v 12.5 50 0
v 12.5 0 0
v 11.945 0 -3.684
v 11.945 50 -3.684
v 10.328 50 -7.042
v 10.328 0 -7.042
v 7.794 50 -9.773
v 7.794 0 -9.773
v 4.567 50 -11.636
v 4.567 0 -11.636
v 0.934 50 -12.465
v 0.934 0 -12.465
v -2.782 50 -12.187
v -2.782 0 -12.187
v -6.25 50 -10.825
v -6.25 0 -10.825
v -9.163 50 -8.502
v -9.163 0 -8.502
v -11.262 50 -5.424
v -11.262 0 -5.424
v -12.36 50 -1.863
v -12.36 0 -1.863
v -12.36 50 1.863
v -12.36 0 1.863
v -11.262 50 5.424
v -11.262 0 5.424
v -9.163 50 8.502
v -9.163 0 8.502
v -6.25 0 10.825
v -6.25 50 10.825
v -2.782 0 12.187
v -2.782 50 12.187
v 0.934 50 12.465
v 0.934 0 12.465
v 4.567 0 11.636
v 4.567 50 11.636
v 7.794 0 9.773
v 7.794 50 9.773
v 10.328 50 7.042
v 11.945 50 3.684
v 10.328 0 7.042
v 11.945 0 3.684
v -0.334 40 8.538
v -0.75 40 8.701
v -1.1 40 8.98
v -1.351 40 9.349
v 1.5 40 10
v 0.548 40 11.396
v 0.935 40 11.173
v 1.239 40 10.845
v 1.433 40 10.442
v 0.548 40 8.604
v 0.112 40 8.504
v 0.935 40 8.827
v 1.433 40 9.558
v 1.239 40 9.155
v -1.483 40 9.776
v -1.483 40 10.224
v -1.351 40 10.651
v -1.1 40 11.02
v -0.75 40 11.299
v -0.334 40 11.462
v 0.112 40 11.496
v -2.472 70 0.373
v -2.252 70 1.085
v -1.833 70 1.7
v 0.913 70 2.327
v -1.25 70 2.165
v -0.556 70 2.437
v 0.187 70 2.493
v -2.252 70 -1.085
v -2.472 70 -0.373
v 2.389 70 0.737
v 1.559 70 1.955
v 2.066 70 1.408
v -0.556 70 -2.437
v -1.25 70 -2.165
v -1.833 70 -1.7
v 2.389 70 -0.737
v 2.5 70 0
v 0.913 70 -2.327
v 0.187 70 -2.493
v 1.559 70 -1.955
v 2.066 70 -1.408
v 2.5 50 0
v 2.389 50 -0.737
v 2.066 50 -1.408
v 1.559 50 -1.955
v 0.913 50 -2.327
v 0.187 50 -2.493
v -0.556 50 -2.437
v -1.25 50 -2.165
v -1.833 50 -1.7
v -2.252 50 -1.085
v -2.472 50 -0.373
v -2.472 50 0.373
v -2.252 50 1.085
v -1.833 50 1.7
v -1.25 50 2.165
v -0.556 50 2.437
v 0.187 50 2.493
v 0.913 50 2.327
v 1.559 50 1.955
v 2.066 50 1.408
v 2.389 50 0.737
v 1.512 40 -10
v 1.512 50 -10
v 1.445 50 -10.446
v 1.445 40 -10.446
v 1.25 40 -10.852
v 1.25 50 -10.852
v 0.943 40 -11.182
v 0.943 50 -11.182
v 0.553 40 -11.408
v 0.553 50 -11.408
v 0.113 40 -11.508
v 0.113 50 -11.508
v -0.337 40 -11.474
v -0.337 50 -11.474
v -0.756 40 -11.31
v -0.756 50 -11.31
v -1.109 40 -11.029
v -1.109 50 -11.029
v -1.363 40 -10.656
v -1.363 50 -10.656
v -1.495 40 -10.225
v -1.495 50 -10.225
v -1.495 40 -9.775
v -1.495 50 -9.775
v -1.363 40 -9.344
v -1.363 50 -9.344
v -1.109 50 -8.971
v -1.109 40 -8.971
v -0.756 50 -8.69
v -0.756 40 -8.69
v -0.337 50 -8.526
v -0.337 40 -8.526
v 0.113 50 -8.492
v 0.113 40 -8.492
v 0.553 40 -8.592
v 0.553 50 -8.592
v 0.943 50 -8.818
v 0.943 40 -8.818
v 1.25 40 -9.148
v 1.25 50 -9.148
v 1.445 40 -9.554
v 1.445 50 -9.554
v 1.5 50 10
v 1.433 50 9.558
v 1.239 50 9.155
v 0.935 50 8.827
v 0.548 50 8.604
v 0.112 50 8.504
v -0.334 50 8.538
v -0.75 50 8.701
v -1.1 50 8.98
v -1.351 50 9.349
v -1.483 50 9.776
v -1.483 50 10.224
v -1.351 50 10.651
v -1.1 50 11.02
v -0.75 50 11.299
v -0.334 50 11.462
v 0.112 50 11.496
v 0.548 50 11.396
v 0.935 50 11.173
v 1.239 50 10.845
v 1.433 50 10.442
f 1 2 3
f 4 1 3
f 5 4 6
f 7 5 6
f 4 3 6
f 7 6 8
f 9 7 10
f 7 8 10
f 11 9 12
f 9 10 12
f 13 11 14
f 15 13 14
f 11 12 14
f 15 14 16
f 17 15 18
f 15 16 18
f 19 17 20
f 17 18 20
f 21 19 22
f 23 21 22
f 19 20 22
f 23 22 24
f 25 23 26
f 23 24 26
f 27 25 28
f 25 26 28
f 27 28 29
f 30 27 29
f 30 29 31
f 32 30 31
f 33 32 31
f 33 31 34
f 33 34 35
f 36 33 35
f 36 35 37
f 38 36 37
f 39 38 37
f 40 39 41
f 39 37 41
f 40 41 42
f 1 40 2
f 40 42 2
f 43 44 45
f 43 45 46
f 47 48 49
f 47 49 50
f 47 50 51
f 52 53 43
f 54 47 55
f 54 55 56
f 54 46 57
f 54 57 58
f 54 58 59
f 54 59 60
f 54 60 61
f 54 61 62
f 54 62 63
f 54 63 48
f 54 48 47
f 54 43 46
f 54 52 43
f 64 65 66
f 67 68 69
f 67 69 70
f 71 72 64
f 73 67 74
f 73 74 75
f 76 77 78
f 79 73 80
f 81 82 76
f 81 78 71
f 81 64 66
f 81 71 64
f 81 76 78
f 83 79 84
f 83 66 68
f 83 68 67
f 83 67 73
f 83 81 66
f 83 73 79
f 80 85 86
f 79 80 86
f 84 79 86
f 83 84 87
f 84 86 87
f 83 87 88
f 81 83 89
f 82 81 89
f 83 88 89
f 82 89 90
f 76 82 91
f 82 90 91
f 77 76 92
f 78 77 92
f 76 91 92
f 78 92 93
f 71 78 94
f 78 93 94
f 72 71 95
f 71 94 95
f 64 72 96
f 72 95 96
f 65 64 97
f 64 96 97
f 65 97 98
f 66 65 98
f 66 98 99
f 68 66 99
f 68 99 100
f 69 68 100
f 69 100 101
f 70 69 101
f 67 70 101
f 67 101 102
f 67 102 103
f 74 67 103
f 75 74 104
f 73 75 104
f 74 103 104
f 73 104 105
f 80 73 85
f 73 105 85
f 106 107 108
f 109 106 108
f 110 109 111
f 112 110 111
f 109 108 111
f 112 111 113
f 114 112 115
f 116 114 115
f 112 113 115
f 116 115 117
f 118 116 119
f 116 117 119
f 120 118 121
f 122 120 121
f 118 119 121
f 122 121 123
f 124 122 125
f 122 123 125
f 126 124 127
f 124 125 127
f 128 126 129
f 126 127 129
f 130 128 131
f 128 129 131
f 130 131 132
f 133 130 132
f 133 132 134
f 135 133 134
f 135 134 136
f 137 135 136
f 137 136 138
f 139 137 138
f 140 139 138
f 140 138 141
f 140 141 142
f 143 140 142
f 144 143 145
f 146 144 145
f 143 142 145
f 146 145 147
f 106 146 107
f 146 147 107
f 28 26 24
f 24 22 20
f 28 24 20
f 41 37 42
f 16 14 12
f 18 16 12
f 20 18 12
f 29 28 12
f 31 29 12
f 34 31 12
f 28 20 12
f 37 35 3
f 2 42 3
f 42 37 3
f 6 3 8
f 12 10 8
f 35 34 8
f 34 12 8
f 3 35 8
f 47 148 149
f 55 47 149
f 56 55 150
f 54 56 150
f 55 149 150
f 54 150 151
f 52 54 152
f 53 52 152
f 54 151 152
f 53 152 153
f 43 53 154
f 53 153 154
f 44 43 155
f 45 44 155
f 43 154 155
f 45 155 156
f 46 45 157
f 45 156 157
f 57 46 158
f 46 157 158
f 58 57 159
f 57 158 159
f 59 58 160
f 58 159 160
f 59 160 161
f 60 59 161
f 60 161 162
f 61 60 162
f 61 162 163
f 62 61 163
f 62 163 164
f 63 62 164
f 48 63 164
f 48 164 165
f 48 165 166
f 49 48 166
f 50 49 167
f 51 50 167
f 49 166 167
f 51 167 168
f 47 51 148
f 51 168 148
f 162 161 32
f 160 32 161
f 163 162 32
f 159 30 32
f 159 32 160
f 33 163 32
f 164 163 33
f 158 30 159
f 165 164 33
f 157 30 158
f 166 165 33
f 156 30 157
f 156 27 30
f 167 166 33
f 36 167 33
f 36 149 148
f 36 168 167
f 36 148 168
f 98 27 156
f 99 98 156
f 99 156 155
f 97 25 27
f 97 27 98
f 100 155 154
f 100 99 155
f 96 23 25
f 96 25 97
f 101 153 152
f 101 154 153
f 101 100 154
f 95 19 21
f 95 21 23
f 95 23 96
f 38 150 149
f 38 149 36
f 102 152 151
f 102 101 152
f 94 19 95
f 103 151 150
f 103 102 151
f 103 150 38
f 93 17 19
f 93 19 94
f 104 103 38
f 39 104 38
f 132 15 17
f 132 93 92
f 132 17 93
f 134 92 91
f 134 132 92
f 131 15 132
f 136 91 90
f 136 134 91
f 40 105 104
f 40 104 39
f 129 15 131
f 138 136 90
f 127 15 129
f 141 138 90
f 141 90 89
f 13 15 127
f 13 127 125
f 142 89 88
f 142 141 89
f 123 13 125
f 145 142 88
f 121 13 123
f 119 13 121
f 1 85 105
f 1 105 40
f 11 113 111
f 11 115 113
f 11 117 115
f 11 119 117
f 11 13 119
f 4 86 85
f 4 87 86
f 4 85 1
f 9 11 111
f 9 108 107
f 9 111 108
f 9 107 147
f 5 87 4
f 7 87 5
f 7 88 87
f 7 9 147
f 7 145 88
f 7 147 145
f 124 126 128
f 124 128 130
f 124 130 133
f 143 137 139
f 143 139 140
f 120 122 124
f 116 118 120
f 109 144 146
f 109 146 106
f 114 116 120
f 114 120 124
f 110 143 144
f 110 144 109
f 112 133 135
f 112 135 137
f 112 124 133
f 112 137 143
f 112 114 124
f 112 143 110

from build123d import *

# Parameters (mm, degrees)
SKETCH_1_R          = 12.5
EXTRUDE_1_DEPTH     = 50
SKETCH_2_R          = 1.5
SKETCH_2_R_2        = 1.512365131
CUT_EXTRUDE_1_DEPTH = 10
SKETCH_3_R          = 2.5
EXTRUDE_2_DEPTH     = 20


with BuildPart() as part:
    # 草图1 → 凸台-拉伸1 (new body)
    with BuildSketch(Plane(origin=(0, 0, 0), x_dir=(1, 0, 0), z_dir=(0, 1, 0))):
        Circle(SKETCH_1_R)
    extrude(amount=EXTRUDE_1_DEPTH)

    # 草图2 → 切除-拉伸1 (cut)
    with BuildSketch(Plane(origin=(0, 50, 0), x_dir=(1, 0, 0), z_dir=(0, 1, 0))):
        with Locations((0, -10)):
            Circle(SKETCH_2_R)
        with Locations((0, 10)):
            Circle(SKETCH_2_R_2)
    extrude(amount=-CUT_EXTRUDE_1_DEPTH, mode=Mode.SUBTRACT)

    # 草图3 → 凸台-拉伸2 (add)
    with BuildSketch(Plane(origin=(0, 50, 0), x_dir=(1, 0, 0), z_dir=(0, 1, 0))):
        Circle(SKETCH_3_R)
    extrude(amount=EXTRUDE_2_DEPTH)


solid = part.part
